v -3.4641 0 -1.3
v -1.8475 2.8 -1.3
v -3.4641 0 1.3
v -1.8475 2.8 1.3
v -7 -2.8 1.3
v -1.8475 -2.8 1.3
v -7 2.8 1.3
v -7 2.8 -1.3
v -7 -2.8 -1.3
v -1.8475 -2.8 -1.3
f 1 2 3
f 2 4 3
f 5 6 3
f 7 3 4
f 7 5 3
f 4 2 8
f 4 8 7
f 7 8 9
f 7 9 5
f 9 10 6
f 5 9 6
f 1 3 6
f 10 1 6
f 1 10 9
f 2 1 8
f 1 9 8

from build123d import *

# Parameters (mm, degrees)
CROQUIS1_R                 = 1.5
SALIENTE_EXTRUIR1_DEPTH    = 7
CORTAR_EXTRUIR1_DEPTH      = 10
CORTAR_EXTRUIR1_DEPTH_BACK = 27.438608133
CROQUIS2_R                 = 1.5
CORTAR_EXTRUIR2_DEPTH      = 27.438608133
CORTAR_EXTRUIR2_DEPTH_BACK = 27.438608133
CROQUIS3_W                 = 6
CROQUIS3_H                 = 7
CORTAR_EXTRUIR3_DEPTH      = 1.5
CROQUIS5_OUTSIDE_W         = 50.708
CROQUIS5_OUTSIDE_H         = 20.708
CROQUIS5_OUTSIDE_W_2       = 3
CROQUIS5_OUTSIDE_H_2       = 6
CORTAR_EXTRUIR4_DEPTH      = 27.438608133
CROQUIS6_OUTSIDE_W         = 6.706
CROQUIS6_OUTSIDE_H         = 9.706
CROQUIS6_OUTSIDE_W_2       = 2.6
CROQUIS6_OUTSIDE_H_2       = 5.6
CORTAR_EXTRUIR5_DEPTH      = 7.245101176


with BuildPart() as part:
    # Croquis1 → Saliente-Extruir1 (new, symmetric)
    with BuildSketch(Plane(origin=(0, 0, 0), x_dir=(0, 0, -1), z_dir=(1, 0, 0))):
        with BuildLine():
            Line((-24, 5), (15, 5))
            Line((15, 5), (15, -5))
            Line((15, -5), (-24, -5))
            ThreePointArc((-24, -5), (-24.707106781, -4.707106781), (-25, -4))
            Line((-25, -4), (-25, 4))
            ThreePointArc((-25, 4), (-24.707106781, 4.707106781), (-24, 5))
        make_face()
        with Locations((-22, 0)):
            Circle(CROQUIS1_R, mode=Mode.SUBTRACT)
    extrude(amount=SALIENTE_EXTRUIR1_DEPTH, both=True)

    # Croquis2 → Cortar-Extruir1 (cut, two sides: drawn at the far end of the back side and taken through both)
    with BuildSketch(Plane.XY.offset(-CORTAR_EXTRUIR1_DEPTH_BACK)):
        Circle(CROQUIS2_R)
    extrude(amount=CORTAR_EXTRUIR1_DEPTH + CORTAR_EXTRUIR1_DEPTH_BACK, mode=Mode.SUBTRACT)

    # Croquis3 → Cortar-Extruir2 (cut, two sides: drawn at the far end of the back side and taken through both)
    with BuildSketch(Plane(origin=(0, 0, 0), x_dir=(1, 0, 0), z_dir=(0, 1, 0)).offset(-CORTAR_EXTRUIR2_DEPTH_BACK)):
        with Locations((0, -21.5)):
            Rectangle(CROQUIS3_W, CROQUIS3_H)
    extrude(amount=CORTAR_EXTRUIR2_DEPTH + CORTAR_EXTRUIR2_DEPTH_BACK, mode=Mode.SUBTRACT)

    # Croquis4 → Cortar-Extruir3 (cut, symmetric)
    with BuildSketch(Plane.XY):
        Polygon((1.732050808, 3), (-1.732050808, 3), (-3.464101615, 0), (-1.732050808, -3), (1.732050808, -3), (3.464101615, 0), align=None)
    extrude(amount=CORTAR_EXTRUIR3_DEPTH, both=True, mode=Mode.SUBTRACT)

    # Croquis5 outside → Cortar-Extruir4 (cut, through all)
    with BuildSketch(Plane(origin=(0, 0, 0), x_dir=(0, 0, -1), z_dir=(1, 0, 0))):
        with Locations((-5, 0)):
            Rectangle(CROQUIS5_OUTSIDE_W, CROQUIS5_OUTSIDE_H)
        Rectangle(CROQUIS5_OUTSIDE_W_2, CROQUIS5_OUTSIDE_H_2, mode=Mode.SUBTRACT)
    extrude(amount=-CORTAR_EXTRUIR4_DEPTH, mode=Mode.SUBTRACT)


with BuildPart() as body_2:
    # of the pieces the cut leaves, the one that is kept (cortar_extruir4_keep)
    add(part.part.solids().sort_by_distance((-7, 3, -1.5))[0])

    # Croquis6 outside → Cortar-Extruir5 (cut, through all)
    with BuildSketch(Plane.ZY.offset(7)):
        Rectangle(CROQUIS6_OUTSIDE_W, CROQUIS6_OUTSIDE_H)
        Rectangle(CROQUIS6_OUTSIDE_W_2, CROQUIS6_OUTSIDE_H_2, mode=Mode.SUBTRACT)
    extrude(amount=-CORTAR_EXTRUIR5_DEPTH, mode=Mode.SUBTRACT)


solid = body_2.part
